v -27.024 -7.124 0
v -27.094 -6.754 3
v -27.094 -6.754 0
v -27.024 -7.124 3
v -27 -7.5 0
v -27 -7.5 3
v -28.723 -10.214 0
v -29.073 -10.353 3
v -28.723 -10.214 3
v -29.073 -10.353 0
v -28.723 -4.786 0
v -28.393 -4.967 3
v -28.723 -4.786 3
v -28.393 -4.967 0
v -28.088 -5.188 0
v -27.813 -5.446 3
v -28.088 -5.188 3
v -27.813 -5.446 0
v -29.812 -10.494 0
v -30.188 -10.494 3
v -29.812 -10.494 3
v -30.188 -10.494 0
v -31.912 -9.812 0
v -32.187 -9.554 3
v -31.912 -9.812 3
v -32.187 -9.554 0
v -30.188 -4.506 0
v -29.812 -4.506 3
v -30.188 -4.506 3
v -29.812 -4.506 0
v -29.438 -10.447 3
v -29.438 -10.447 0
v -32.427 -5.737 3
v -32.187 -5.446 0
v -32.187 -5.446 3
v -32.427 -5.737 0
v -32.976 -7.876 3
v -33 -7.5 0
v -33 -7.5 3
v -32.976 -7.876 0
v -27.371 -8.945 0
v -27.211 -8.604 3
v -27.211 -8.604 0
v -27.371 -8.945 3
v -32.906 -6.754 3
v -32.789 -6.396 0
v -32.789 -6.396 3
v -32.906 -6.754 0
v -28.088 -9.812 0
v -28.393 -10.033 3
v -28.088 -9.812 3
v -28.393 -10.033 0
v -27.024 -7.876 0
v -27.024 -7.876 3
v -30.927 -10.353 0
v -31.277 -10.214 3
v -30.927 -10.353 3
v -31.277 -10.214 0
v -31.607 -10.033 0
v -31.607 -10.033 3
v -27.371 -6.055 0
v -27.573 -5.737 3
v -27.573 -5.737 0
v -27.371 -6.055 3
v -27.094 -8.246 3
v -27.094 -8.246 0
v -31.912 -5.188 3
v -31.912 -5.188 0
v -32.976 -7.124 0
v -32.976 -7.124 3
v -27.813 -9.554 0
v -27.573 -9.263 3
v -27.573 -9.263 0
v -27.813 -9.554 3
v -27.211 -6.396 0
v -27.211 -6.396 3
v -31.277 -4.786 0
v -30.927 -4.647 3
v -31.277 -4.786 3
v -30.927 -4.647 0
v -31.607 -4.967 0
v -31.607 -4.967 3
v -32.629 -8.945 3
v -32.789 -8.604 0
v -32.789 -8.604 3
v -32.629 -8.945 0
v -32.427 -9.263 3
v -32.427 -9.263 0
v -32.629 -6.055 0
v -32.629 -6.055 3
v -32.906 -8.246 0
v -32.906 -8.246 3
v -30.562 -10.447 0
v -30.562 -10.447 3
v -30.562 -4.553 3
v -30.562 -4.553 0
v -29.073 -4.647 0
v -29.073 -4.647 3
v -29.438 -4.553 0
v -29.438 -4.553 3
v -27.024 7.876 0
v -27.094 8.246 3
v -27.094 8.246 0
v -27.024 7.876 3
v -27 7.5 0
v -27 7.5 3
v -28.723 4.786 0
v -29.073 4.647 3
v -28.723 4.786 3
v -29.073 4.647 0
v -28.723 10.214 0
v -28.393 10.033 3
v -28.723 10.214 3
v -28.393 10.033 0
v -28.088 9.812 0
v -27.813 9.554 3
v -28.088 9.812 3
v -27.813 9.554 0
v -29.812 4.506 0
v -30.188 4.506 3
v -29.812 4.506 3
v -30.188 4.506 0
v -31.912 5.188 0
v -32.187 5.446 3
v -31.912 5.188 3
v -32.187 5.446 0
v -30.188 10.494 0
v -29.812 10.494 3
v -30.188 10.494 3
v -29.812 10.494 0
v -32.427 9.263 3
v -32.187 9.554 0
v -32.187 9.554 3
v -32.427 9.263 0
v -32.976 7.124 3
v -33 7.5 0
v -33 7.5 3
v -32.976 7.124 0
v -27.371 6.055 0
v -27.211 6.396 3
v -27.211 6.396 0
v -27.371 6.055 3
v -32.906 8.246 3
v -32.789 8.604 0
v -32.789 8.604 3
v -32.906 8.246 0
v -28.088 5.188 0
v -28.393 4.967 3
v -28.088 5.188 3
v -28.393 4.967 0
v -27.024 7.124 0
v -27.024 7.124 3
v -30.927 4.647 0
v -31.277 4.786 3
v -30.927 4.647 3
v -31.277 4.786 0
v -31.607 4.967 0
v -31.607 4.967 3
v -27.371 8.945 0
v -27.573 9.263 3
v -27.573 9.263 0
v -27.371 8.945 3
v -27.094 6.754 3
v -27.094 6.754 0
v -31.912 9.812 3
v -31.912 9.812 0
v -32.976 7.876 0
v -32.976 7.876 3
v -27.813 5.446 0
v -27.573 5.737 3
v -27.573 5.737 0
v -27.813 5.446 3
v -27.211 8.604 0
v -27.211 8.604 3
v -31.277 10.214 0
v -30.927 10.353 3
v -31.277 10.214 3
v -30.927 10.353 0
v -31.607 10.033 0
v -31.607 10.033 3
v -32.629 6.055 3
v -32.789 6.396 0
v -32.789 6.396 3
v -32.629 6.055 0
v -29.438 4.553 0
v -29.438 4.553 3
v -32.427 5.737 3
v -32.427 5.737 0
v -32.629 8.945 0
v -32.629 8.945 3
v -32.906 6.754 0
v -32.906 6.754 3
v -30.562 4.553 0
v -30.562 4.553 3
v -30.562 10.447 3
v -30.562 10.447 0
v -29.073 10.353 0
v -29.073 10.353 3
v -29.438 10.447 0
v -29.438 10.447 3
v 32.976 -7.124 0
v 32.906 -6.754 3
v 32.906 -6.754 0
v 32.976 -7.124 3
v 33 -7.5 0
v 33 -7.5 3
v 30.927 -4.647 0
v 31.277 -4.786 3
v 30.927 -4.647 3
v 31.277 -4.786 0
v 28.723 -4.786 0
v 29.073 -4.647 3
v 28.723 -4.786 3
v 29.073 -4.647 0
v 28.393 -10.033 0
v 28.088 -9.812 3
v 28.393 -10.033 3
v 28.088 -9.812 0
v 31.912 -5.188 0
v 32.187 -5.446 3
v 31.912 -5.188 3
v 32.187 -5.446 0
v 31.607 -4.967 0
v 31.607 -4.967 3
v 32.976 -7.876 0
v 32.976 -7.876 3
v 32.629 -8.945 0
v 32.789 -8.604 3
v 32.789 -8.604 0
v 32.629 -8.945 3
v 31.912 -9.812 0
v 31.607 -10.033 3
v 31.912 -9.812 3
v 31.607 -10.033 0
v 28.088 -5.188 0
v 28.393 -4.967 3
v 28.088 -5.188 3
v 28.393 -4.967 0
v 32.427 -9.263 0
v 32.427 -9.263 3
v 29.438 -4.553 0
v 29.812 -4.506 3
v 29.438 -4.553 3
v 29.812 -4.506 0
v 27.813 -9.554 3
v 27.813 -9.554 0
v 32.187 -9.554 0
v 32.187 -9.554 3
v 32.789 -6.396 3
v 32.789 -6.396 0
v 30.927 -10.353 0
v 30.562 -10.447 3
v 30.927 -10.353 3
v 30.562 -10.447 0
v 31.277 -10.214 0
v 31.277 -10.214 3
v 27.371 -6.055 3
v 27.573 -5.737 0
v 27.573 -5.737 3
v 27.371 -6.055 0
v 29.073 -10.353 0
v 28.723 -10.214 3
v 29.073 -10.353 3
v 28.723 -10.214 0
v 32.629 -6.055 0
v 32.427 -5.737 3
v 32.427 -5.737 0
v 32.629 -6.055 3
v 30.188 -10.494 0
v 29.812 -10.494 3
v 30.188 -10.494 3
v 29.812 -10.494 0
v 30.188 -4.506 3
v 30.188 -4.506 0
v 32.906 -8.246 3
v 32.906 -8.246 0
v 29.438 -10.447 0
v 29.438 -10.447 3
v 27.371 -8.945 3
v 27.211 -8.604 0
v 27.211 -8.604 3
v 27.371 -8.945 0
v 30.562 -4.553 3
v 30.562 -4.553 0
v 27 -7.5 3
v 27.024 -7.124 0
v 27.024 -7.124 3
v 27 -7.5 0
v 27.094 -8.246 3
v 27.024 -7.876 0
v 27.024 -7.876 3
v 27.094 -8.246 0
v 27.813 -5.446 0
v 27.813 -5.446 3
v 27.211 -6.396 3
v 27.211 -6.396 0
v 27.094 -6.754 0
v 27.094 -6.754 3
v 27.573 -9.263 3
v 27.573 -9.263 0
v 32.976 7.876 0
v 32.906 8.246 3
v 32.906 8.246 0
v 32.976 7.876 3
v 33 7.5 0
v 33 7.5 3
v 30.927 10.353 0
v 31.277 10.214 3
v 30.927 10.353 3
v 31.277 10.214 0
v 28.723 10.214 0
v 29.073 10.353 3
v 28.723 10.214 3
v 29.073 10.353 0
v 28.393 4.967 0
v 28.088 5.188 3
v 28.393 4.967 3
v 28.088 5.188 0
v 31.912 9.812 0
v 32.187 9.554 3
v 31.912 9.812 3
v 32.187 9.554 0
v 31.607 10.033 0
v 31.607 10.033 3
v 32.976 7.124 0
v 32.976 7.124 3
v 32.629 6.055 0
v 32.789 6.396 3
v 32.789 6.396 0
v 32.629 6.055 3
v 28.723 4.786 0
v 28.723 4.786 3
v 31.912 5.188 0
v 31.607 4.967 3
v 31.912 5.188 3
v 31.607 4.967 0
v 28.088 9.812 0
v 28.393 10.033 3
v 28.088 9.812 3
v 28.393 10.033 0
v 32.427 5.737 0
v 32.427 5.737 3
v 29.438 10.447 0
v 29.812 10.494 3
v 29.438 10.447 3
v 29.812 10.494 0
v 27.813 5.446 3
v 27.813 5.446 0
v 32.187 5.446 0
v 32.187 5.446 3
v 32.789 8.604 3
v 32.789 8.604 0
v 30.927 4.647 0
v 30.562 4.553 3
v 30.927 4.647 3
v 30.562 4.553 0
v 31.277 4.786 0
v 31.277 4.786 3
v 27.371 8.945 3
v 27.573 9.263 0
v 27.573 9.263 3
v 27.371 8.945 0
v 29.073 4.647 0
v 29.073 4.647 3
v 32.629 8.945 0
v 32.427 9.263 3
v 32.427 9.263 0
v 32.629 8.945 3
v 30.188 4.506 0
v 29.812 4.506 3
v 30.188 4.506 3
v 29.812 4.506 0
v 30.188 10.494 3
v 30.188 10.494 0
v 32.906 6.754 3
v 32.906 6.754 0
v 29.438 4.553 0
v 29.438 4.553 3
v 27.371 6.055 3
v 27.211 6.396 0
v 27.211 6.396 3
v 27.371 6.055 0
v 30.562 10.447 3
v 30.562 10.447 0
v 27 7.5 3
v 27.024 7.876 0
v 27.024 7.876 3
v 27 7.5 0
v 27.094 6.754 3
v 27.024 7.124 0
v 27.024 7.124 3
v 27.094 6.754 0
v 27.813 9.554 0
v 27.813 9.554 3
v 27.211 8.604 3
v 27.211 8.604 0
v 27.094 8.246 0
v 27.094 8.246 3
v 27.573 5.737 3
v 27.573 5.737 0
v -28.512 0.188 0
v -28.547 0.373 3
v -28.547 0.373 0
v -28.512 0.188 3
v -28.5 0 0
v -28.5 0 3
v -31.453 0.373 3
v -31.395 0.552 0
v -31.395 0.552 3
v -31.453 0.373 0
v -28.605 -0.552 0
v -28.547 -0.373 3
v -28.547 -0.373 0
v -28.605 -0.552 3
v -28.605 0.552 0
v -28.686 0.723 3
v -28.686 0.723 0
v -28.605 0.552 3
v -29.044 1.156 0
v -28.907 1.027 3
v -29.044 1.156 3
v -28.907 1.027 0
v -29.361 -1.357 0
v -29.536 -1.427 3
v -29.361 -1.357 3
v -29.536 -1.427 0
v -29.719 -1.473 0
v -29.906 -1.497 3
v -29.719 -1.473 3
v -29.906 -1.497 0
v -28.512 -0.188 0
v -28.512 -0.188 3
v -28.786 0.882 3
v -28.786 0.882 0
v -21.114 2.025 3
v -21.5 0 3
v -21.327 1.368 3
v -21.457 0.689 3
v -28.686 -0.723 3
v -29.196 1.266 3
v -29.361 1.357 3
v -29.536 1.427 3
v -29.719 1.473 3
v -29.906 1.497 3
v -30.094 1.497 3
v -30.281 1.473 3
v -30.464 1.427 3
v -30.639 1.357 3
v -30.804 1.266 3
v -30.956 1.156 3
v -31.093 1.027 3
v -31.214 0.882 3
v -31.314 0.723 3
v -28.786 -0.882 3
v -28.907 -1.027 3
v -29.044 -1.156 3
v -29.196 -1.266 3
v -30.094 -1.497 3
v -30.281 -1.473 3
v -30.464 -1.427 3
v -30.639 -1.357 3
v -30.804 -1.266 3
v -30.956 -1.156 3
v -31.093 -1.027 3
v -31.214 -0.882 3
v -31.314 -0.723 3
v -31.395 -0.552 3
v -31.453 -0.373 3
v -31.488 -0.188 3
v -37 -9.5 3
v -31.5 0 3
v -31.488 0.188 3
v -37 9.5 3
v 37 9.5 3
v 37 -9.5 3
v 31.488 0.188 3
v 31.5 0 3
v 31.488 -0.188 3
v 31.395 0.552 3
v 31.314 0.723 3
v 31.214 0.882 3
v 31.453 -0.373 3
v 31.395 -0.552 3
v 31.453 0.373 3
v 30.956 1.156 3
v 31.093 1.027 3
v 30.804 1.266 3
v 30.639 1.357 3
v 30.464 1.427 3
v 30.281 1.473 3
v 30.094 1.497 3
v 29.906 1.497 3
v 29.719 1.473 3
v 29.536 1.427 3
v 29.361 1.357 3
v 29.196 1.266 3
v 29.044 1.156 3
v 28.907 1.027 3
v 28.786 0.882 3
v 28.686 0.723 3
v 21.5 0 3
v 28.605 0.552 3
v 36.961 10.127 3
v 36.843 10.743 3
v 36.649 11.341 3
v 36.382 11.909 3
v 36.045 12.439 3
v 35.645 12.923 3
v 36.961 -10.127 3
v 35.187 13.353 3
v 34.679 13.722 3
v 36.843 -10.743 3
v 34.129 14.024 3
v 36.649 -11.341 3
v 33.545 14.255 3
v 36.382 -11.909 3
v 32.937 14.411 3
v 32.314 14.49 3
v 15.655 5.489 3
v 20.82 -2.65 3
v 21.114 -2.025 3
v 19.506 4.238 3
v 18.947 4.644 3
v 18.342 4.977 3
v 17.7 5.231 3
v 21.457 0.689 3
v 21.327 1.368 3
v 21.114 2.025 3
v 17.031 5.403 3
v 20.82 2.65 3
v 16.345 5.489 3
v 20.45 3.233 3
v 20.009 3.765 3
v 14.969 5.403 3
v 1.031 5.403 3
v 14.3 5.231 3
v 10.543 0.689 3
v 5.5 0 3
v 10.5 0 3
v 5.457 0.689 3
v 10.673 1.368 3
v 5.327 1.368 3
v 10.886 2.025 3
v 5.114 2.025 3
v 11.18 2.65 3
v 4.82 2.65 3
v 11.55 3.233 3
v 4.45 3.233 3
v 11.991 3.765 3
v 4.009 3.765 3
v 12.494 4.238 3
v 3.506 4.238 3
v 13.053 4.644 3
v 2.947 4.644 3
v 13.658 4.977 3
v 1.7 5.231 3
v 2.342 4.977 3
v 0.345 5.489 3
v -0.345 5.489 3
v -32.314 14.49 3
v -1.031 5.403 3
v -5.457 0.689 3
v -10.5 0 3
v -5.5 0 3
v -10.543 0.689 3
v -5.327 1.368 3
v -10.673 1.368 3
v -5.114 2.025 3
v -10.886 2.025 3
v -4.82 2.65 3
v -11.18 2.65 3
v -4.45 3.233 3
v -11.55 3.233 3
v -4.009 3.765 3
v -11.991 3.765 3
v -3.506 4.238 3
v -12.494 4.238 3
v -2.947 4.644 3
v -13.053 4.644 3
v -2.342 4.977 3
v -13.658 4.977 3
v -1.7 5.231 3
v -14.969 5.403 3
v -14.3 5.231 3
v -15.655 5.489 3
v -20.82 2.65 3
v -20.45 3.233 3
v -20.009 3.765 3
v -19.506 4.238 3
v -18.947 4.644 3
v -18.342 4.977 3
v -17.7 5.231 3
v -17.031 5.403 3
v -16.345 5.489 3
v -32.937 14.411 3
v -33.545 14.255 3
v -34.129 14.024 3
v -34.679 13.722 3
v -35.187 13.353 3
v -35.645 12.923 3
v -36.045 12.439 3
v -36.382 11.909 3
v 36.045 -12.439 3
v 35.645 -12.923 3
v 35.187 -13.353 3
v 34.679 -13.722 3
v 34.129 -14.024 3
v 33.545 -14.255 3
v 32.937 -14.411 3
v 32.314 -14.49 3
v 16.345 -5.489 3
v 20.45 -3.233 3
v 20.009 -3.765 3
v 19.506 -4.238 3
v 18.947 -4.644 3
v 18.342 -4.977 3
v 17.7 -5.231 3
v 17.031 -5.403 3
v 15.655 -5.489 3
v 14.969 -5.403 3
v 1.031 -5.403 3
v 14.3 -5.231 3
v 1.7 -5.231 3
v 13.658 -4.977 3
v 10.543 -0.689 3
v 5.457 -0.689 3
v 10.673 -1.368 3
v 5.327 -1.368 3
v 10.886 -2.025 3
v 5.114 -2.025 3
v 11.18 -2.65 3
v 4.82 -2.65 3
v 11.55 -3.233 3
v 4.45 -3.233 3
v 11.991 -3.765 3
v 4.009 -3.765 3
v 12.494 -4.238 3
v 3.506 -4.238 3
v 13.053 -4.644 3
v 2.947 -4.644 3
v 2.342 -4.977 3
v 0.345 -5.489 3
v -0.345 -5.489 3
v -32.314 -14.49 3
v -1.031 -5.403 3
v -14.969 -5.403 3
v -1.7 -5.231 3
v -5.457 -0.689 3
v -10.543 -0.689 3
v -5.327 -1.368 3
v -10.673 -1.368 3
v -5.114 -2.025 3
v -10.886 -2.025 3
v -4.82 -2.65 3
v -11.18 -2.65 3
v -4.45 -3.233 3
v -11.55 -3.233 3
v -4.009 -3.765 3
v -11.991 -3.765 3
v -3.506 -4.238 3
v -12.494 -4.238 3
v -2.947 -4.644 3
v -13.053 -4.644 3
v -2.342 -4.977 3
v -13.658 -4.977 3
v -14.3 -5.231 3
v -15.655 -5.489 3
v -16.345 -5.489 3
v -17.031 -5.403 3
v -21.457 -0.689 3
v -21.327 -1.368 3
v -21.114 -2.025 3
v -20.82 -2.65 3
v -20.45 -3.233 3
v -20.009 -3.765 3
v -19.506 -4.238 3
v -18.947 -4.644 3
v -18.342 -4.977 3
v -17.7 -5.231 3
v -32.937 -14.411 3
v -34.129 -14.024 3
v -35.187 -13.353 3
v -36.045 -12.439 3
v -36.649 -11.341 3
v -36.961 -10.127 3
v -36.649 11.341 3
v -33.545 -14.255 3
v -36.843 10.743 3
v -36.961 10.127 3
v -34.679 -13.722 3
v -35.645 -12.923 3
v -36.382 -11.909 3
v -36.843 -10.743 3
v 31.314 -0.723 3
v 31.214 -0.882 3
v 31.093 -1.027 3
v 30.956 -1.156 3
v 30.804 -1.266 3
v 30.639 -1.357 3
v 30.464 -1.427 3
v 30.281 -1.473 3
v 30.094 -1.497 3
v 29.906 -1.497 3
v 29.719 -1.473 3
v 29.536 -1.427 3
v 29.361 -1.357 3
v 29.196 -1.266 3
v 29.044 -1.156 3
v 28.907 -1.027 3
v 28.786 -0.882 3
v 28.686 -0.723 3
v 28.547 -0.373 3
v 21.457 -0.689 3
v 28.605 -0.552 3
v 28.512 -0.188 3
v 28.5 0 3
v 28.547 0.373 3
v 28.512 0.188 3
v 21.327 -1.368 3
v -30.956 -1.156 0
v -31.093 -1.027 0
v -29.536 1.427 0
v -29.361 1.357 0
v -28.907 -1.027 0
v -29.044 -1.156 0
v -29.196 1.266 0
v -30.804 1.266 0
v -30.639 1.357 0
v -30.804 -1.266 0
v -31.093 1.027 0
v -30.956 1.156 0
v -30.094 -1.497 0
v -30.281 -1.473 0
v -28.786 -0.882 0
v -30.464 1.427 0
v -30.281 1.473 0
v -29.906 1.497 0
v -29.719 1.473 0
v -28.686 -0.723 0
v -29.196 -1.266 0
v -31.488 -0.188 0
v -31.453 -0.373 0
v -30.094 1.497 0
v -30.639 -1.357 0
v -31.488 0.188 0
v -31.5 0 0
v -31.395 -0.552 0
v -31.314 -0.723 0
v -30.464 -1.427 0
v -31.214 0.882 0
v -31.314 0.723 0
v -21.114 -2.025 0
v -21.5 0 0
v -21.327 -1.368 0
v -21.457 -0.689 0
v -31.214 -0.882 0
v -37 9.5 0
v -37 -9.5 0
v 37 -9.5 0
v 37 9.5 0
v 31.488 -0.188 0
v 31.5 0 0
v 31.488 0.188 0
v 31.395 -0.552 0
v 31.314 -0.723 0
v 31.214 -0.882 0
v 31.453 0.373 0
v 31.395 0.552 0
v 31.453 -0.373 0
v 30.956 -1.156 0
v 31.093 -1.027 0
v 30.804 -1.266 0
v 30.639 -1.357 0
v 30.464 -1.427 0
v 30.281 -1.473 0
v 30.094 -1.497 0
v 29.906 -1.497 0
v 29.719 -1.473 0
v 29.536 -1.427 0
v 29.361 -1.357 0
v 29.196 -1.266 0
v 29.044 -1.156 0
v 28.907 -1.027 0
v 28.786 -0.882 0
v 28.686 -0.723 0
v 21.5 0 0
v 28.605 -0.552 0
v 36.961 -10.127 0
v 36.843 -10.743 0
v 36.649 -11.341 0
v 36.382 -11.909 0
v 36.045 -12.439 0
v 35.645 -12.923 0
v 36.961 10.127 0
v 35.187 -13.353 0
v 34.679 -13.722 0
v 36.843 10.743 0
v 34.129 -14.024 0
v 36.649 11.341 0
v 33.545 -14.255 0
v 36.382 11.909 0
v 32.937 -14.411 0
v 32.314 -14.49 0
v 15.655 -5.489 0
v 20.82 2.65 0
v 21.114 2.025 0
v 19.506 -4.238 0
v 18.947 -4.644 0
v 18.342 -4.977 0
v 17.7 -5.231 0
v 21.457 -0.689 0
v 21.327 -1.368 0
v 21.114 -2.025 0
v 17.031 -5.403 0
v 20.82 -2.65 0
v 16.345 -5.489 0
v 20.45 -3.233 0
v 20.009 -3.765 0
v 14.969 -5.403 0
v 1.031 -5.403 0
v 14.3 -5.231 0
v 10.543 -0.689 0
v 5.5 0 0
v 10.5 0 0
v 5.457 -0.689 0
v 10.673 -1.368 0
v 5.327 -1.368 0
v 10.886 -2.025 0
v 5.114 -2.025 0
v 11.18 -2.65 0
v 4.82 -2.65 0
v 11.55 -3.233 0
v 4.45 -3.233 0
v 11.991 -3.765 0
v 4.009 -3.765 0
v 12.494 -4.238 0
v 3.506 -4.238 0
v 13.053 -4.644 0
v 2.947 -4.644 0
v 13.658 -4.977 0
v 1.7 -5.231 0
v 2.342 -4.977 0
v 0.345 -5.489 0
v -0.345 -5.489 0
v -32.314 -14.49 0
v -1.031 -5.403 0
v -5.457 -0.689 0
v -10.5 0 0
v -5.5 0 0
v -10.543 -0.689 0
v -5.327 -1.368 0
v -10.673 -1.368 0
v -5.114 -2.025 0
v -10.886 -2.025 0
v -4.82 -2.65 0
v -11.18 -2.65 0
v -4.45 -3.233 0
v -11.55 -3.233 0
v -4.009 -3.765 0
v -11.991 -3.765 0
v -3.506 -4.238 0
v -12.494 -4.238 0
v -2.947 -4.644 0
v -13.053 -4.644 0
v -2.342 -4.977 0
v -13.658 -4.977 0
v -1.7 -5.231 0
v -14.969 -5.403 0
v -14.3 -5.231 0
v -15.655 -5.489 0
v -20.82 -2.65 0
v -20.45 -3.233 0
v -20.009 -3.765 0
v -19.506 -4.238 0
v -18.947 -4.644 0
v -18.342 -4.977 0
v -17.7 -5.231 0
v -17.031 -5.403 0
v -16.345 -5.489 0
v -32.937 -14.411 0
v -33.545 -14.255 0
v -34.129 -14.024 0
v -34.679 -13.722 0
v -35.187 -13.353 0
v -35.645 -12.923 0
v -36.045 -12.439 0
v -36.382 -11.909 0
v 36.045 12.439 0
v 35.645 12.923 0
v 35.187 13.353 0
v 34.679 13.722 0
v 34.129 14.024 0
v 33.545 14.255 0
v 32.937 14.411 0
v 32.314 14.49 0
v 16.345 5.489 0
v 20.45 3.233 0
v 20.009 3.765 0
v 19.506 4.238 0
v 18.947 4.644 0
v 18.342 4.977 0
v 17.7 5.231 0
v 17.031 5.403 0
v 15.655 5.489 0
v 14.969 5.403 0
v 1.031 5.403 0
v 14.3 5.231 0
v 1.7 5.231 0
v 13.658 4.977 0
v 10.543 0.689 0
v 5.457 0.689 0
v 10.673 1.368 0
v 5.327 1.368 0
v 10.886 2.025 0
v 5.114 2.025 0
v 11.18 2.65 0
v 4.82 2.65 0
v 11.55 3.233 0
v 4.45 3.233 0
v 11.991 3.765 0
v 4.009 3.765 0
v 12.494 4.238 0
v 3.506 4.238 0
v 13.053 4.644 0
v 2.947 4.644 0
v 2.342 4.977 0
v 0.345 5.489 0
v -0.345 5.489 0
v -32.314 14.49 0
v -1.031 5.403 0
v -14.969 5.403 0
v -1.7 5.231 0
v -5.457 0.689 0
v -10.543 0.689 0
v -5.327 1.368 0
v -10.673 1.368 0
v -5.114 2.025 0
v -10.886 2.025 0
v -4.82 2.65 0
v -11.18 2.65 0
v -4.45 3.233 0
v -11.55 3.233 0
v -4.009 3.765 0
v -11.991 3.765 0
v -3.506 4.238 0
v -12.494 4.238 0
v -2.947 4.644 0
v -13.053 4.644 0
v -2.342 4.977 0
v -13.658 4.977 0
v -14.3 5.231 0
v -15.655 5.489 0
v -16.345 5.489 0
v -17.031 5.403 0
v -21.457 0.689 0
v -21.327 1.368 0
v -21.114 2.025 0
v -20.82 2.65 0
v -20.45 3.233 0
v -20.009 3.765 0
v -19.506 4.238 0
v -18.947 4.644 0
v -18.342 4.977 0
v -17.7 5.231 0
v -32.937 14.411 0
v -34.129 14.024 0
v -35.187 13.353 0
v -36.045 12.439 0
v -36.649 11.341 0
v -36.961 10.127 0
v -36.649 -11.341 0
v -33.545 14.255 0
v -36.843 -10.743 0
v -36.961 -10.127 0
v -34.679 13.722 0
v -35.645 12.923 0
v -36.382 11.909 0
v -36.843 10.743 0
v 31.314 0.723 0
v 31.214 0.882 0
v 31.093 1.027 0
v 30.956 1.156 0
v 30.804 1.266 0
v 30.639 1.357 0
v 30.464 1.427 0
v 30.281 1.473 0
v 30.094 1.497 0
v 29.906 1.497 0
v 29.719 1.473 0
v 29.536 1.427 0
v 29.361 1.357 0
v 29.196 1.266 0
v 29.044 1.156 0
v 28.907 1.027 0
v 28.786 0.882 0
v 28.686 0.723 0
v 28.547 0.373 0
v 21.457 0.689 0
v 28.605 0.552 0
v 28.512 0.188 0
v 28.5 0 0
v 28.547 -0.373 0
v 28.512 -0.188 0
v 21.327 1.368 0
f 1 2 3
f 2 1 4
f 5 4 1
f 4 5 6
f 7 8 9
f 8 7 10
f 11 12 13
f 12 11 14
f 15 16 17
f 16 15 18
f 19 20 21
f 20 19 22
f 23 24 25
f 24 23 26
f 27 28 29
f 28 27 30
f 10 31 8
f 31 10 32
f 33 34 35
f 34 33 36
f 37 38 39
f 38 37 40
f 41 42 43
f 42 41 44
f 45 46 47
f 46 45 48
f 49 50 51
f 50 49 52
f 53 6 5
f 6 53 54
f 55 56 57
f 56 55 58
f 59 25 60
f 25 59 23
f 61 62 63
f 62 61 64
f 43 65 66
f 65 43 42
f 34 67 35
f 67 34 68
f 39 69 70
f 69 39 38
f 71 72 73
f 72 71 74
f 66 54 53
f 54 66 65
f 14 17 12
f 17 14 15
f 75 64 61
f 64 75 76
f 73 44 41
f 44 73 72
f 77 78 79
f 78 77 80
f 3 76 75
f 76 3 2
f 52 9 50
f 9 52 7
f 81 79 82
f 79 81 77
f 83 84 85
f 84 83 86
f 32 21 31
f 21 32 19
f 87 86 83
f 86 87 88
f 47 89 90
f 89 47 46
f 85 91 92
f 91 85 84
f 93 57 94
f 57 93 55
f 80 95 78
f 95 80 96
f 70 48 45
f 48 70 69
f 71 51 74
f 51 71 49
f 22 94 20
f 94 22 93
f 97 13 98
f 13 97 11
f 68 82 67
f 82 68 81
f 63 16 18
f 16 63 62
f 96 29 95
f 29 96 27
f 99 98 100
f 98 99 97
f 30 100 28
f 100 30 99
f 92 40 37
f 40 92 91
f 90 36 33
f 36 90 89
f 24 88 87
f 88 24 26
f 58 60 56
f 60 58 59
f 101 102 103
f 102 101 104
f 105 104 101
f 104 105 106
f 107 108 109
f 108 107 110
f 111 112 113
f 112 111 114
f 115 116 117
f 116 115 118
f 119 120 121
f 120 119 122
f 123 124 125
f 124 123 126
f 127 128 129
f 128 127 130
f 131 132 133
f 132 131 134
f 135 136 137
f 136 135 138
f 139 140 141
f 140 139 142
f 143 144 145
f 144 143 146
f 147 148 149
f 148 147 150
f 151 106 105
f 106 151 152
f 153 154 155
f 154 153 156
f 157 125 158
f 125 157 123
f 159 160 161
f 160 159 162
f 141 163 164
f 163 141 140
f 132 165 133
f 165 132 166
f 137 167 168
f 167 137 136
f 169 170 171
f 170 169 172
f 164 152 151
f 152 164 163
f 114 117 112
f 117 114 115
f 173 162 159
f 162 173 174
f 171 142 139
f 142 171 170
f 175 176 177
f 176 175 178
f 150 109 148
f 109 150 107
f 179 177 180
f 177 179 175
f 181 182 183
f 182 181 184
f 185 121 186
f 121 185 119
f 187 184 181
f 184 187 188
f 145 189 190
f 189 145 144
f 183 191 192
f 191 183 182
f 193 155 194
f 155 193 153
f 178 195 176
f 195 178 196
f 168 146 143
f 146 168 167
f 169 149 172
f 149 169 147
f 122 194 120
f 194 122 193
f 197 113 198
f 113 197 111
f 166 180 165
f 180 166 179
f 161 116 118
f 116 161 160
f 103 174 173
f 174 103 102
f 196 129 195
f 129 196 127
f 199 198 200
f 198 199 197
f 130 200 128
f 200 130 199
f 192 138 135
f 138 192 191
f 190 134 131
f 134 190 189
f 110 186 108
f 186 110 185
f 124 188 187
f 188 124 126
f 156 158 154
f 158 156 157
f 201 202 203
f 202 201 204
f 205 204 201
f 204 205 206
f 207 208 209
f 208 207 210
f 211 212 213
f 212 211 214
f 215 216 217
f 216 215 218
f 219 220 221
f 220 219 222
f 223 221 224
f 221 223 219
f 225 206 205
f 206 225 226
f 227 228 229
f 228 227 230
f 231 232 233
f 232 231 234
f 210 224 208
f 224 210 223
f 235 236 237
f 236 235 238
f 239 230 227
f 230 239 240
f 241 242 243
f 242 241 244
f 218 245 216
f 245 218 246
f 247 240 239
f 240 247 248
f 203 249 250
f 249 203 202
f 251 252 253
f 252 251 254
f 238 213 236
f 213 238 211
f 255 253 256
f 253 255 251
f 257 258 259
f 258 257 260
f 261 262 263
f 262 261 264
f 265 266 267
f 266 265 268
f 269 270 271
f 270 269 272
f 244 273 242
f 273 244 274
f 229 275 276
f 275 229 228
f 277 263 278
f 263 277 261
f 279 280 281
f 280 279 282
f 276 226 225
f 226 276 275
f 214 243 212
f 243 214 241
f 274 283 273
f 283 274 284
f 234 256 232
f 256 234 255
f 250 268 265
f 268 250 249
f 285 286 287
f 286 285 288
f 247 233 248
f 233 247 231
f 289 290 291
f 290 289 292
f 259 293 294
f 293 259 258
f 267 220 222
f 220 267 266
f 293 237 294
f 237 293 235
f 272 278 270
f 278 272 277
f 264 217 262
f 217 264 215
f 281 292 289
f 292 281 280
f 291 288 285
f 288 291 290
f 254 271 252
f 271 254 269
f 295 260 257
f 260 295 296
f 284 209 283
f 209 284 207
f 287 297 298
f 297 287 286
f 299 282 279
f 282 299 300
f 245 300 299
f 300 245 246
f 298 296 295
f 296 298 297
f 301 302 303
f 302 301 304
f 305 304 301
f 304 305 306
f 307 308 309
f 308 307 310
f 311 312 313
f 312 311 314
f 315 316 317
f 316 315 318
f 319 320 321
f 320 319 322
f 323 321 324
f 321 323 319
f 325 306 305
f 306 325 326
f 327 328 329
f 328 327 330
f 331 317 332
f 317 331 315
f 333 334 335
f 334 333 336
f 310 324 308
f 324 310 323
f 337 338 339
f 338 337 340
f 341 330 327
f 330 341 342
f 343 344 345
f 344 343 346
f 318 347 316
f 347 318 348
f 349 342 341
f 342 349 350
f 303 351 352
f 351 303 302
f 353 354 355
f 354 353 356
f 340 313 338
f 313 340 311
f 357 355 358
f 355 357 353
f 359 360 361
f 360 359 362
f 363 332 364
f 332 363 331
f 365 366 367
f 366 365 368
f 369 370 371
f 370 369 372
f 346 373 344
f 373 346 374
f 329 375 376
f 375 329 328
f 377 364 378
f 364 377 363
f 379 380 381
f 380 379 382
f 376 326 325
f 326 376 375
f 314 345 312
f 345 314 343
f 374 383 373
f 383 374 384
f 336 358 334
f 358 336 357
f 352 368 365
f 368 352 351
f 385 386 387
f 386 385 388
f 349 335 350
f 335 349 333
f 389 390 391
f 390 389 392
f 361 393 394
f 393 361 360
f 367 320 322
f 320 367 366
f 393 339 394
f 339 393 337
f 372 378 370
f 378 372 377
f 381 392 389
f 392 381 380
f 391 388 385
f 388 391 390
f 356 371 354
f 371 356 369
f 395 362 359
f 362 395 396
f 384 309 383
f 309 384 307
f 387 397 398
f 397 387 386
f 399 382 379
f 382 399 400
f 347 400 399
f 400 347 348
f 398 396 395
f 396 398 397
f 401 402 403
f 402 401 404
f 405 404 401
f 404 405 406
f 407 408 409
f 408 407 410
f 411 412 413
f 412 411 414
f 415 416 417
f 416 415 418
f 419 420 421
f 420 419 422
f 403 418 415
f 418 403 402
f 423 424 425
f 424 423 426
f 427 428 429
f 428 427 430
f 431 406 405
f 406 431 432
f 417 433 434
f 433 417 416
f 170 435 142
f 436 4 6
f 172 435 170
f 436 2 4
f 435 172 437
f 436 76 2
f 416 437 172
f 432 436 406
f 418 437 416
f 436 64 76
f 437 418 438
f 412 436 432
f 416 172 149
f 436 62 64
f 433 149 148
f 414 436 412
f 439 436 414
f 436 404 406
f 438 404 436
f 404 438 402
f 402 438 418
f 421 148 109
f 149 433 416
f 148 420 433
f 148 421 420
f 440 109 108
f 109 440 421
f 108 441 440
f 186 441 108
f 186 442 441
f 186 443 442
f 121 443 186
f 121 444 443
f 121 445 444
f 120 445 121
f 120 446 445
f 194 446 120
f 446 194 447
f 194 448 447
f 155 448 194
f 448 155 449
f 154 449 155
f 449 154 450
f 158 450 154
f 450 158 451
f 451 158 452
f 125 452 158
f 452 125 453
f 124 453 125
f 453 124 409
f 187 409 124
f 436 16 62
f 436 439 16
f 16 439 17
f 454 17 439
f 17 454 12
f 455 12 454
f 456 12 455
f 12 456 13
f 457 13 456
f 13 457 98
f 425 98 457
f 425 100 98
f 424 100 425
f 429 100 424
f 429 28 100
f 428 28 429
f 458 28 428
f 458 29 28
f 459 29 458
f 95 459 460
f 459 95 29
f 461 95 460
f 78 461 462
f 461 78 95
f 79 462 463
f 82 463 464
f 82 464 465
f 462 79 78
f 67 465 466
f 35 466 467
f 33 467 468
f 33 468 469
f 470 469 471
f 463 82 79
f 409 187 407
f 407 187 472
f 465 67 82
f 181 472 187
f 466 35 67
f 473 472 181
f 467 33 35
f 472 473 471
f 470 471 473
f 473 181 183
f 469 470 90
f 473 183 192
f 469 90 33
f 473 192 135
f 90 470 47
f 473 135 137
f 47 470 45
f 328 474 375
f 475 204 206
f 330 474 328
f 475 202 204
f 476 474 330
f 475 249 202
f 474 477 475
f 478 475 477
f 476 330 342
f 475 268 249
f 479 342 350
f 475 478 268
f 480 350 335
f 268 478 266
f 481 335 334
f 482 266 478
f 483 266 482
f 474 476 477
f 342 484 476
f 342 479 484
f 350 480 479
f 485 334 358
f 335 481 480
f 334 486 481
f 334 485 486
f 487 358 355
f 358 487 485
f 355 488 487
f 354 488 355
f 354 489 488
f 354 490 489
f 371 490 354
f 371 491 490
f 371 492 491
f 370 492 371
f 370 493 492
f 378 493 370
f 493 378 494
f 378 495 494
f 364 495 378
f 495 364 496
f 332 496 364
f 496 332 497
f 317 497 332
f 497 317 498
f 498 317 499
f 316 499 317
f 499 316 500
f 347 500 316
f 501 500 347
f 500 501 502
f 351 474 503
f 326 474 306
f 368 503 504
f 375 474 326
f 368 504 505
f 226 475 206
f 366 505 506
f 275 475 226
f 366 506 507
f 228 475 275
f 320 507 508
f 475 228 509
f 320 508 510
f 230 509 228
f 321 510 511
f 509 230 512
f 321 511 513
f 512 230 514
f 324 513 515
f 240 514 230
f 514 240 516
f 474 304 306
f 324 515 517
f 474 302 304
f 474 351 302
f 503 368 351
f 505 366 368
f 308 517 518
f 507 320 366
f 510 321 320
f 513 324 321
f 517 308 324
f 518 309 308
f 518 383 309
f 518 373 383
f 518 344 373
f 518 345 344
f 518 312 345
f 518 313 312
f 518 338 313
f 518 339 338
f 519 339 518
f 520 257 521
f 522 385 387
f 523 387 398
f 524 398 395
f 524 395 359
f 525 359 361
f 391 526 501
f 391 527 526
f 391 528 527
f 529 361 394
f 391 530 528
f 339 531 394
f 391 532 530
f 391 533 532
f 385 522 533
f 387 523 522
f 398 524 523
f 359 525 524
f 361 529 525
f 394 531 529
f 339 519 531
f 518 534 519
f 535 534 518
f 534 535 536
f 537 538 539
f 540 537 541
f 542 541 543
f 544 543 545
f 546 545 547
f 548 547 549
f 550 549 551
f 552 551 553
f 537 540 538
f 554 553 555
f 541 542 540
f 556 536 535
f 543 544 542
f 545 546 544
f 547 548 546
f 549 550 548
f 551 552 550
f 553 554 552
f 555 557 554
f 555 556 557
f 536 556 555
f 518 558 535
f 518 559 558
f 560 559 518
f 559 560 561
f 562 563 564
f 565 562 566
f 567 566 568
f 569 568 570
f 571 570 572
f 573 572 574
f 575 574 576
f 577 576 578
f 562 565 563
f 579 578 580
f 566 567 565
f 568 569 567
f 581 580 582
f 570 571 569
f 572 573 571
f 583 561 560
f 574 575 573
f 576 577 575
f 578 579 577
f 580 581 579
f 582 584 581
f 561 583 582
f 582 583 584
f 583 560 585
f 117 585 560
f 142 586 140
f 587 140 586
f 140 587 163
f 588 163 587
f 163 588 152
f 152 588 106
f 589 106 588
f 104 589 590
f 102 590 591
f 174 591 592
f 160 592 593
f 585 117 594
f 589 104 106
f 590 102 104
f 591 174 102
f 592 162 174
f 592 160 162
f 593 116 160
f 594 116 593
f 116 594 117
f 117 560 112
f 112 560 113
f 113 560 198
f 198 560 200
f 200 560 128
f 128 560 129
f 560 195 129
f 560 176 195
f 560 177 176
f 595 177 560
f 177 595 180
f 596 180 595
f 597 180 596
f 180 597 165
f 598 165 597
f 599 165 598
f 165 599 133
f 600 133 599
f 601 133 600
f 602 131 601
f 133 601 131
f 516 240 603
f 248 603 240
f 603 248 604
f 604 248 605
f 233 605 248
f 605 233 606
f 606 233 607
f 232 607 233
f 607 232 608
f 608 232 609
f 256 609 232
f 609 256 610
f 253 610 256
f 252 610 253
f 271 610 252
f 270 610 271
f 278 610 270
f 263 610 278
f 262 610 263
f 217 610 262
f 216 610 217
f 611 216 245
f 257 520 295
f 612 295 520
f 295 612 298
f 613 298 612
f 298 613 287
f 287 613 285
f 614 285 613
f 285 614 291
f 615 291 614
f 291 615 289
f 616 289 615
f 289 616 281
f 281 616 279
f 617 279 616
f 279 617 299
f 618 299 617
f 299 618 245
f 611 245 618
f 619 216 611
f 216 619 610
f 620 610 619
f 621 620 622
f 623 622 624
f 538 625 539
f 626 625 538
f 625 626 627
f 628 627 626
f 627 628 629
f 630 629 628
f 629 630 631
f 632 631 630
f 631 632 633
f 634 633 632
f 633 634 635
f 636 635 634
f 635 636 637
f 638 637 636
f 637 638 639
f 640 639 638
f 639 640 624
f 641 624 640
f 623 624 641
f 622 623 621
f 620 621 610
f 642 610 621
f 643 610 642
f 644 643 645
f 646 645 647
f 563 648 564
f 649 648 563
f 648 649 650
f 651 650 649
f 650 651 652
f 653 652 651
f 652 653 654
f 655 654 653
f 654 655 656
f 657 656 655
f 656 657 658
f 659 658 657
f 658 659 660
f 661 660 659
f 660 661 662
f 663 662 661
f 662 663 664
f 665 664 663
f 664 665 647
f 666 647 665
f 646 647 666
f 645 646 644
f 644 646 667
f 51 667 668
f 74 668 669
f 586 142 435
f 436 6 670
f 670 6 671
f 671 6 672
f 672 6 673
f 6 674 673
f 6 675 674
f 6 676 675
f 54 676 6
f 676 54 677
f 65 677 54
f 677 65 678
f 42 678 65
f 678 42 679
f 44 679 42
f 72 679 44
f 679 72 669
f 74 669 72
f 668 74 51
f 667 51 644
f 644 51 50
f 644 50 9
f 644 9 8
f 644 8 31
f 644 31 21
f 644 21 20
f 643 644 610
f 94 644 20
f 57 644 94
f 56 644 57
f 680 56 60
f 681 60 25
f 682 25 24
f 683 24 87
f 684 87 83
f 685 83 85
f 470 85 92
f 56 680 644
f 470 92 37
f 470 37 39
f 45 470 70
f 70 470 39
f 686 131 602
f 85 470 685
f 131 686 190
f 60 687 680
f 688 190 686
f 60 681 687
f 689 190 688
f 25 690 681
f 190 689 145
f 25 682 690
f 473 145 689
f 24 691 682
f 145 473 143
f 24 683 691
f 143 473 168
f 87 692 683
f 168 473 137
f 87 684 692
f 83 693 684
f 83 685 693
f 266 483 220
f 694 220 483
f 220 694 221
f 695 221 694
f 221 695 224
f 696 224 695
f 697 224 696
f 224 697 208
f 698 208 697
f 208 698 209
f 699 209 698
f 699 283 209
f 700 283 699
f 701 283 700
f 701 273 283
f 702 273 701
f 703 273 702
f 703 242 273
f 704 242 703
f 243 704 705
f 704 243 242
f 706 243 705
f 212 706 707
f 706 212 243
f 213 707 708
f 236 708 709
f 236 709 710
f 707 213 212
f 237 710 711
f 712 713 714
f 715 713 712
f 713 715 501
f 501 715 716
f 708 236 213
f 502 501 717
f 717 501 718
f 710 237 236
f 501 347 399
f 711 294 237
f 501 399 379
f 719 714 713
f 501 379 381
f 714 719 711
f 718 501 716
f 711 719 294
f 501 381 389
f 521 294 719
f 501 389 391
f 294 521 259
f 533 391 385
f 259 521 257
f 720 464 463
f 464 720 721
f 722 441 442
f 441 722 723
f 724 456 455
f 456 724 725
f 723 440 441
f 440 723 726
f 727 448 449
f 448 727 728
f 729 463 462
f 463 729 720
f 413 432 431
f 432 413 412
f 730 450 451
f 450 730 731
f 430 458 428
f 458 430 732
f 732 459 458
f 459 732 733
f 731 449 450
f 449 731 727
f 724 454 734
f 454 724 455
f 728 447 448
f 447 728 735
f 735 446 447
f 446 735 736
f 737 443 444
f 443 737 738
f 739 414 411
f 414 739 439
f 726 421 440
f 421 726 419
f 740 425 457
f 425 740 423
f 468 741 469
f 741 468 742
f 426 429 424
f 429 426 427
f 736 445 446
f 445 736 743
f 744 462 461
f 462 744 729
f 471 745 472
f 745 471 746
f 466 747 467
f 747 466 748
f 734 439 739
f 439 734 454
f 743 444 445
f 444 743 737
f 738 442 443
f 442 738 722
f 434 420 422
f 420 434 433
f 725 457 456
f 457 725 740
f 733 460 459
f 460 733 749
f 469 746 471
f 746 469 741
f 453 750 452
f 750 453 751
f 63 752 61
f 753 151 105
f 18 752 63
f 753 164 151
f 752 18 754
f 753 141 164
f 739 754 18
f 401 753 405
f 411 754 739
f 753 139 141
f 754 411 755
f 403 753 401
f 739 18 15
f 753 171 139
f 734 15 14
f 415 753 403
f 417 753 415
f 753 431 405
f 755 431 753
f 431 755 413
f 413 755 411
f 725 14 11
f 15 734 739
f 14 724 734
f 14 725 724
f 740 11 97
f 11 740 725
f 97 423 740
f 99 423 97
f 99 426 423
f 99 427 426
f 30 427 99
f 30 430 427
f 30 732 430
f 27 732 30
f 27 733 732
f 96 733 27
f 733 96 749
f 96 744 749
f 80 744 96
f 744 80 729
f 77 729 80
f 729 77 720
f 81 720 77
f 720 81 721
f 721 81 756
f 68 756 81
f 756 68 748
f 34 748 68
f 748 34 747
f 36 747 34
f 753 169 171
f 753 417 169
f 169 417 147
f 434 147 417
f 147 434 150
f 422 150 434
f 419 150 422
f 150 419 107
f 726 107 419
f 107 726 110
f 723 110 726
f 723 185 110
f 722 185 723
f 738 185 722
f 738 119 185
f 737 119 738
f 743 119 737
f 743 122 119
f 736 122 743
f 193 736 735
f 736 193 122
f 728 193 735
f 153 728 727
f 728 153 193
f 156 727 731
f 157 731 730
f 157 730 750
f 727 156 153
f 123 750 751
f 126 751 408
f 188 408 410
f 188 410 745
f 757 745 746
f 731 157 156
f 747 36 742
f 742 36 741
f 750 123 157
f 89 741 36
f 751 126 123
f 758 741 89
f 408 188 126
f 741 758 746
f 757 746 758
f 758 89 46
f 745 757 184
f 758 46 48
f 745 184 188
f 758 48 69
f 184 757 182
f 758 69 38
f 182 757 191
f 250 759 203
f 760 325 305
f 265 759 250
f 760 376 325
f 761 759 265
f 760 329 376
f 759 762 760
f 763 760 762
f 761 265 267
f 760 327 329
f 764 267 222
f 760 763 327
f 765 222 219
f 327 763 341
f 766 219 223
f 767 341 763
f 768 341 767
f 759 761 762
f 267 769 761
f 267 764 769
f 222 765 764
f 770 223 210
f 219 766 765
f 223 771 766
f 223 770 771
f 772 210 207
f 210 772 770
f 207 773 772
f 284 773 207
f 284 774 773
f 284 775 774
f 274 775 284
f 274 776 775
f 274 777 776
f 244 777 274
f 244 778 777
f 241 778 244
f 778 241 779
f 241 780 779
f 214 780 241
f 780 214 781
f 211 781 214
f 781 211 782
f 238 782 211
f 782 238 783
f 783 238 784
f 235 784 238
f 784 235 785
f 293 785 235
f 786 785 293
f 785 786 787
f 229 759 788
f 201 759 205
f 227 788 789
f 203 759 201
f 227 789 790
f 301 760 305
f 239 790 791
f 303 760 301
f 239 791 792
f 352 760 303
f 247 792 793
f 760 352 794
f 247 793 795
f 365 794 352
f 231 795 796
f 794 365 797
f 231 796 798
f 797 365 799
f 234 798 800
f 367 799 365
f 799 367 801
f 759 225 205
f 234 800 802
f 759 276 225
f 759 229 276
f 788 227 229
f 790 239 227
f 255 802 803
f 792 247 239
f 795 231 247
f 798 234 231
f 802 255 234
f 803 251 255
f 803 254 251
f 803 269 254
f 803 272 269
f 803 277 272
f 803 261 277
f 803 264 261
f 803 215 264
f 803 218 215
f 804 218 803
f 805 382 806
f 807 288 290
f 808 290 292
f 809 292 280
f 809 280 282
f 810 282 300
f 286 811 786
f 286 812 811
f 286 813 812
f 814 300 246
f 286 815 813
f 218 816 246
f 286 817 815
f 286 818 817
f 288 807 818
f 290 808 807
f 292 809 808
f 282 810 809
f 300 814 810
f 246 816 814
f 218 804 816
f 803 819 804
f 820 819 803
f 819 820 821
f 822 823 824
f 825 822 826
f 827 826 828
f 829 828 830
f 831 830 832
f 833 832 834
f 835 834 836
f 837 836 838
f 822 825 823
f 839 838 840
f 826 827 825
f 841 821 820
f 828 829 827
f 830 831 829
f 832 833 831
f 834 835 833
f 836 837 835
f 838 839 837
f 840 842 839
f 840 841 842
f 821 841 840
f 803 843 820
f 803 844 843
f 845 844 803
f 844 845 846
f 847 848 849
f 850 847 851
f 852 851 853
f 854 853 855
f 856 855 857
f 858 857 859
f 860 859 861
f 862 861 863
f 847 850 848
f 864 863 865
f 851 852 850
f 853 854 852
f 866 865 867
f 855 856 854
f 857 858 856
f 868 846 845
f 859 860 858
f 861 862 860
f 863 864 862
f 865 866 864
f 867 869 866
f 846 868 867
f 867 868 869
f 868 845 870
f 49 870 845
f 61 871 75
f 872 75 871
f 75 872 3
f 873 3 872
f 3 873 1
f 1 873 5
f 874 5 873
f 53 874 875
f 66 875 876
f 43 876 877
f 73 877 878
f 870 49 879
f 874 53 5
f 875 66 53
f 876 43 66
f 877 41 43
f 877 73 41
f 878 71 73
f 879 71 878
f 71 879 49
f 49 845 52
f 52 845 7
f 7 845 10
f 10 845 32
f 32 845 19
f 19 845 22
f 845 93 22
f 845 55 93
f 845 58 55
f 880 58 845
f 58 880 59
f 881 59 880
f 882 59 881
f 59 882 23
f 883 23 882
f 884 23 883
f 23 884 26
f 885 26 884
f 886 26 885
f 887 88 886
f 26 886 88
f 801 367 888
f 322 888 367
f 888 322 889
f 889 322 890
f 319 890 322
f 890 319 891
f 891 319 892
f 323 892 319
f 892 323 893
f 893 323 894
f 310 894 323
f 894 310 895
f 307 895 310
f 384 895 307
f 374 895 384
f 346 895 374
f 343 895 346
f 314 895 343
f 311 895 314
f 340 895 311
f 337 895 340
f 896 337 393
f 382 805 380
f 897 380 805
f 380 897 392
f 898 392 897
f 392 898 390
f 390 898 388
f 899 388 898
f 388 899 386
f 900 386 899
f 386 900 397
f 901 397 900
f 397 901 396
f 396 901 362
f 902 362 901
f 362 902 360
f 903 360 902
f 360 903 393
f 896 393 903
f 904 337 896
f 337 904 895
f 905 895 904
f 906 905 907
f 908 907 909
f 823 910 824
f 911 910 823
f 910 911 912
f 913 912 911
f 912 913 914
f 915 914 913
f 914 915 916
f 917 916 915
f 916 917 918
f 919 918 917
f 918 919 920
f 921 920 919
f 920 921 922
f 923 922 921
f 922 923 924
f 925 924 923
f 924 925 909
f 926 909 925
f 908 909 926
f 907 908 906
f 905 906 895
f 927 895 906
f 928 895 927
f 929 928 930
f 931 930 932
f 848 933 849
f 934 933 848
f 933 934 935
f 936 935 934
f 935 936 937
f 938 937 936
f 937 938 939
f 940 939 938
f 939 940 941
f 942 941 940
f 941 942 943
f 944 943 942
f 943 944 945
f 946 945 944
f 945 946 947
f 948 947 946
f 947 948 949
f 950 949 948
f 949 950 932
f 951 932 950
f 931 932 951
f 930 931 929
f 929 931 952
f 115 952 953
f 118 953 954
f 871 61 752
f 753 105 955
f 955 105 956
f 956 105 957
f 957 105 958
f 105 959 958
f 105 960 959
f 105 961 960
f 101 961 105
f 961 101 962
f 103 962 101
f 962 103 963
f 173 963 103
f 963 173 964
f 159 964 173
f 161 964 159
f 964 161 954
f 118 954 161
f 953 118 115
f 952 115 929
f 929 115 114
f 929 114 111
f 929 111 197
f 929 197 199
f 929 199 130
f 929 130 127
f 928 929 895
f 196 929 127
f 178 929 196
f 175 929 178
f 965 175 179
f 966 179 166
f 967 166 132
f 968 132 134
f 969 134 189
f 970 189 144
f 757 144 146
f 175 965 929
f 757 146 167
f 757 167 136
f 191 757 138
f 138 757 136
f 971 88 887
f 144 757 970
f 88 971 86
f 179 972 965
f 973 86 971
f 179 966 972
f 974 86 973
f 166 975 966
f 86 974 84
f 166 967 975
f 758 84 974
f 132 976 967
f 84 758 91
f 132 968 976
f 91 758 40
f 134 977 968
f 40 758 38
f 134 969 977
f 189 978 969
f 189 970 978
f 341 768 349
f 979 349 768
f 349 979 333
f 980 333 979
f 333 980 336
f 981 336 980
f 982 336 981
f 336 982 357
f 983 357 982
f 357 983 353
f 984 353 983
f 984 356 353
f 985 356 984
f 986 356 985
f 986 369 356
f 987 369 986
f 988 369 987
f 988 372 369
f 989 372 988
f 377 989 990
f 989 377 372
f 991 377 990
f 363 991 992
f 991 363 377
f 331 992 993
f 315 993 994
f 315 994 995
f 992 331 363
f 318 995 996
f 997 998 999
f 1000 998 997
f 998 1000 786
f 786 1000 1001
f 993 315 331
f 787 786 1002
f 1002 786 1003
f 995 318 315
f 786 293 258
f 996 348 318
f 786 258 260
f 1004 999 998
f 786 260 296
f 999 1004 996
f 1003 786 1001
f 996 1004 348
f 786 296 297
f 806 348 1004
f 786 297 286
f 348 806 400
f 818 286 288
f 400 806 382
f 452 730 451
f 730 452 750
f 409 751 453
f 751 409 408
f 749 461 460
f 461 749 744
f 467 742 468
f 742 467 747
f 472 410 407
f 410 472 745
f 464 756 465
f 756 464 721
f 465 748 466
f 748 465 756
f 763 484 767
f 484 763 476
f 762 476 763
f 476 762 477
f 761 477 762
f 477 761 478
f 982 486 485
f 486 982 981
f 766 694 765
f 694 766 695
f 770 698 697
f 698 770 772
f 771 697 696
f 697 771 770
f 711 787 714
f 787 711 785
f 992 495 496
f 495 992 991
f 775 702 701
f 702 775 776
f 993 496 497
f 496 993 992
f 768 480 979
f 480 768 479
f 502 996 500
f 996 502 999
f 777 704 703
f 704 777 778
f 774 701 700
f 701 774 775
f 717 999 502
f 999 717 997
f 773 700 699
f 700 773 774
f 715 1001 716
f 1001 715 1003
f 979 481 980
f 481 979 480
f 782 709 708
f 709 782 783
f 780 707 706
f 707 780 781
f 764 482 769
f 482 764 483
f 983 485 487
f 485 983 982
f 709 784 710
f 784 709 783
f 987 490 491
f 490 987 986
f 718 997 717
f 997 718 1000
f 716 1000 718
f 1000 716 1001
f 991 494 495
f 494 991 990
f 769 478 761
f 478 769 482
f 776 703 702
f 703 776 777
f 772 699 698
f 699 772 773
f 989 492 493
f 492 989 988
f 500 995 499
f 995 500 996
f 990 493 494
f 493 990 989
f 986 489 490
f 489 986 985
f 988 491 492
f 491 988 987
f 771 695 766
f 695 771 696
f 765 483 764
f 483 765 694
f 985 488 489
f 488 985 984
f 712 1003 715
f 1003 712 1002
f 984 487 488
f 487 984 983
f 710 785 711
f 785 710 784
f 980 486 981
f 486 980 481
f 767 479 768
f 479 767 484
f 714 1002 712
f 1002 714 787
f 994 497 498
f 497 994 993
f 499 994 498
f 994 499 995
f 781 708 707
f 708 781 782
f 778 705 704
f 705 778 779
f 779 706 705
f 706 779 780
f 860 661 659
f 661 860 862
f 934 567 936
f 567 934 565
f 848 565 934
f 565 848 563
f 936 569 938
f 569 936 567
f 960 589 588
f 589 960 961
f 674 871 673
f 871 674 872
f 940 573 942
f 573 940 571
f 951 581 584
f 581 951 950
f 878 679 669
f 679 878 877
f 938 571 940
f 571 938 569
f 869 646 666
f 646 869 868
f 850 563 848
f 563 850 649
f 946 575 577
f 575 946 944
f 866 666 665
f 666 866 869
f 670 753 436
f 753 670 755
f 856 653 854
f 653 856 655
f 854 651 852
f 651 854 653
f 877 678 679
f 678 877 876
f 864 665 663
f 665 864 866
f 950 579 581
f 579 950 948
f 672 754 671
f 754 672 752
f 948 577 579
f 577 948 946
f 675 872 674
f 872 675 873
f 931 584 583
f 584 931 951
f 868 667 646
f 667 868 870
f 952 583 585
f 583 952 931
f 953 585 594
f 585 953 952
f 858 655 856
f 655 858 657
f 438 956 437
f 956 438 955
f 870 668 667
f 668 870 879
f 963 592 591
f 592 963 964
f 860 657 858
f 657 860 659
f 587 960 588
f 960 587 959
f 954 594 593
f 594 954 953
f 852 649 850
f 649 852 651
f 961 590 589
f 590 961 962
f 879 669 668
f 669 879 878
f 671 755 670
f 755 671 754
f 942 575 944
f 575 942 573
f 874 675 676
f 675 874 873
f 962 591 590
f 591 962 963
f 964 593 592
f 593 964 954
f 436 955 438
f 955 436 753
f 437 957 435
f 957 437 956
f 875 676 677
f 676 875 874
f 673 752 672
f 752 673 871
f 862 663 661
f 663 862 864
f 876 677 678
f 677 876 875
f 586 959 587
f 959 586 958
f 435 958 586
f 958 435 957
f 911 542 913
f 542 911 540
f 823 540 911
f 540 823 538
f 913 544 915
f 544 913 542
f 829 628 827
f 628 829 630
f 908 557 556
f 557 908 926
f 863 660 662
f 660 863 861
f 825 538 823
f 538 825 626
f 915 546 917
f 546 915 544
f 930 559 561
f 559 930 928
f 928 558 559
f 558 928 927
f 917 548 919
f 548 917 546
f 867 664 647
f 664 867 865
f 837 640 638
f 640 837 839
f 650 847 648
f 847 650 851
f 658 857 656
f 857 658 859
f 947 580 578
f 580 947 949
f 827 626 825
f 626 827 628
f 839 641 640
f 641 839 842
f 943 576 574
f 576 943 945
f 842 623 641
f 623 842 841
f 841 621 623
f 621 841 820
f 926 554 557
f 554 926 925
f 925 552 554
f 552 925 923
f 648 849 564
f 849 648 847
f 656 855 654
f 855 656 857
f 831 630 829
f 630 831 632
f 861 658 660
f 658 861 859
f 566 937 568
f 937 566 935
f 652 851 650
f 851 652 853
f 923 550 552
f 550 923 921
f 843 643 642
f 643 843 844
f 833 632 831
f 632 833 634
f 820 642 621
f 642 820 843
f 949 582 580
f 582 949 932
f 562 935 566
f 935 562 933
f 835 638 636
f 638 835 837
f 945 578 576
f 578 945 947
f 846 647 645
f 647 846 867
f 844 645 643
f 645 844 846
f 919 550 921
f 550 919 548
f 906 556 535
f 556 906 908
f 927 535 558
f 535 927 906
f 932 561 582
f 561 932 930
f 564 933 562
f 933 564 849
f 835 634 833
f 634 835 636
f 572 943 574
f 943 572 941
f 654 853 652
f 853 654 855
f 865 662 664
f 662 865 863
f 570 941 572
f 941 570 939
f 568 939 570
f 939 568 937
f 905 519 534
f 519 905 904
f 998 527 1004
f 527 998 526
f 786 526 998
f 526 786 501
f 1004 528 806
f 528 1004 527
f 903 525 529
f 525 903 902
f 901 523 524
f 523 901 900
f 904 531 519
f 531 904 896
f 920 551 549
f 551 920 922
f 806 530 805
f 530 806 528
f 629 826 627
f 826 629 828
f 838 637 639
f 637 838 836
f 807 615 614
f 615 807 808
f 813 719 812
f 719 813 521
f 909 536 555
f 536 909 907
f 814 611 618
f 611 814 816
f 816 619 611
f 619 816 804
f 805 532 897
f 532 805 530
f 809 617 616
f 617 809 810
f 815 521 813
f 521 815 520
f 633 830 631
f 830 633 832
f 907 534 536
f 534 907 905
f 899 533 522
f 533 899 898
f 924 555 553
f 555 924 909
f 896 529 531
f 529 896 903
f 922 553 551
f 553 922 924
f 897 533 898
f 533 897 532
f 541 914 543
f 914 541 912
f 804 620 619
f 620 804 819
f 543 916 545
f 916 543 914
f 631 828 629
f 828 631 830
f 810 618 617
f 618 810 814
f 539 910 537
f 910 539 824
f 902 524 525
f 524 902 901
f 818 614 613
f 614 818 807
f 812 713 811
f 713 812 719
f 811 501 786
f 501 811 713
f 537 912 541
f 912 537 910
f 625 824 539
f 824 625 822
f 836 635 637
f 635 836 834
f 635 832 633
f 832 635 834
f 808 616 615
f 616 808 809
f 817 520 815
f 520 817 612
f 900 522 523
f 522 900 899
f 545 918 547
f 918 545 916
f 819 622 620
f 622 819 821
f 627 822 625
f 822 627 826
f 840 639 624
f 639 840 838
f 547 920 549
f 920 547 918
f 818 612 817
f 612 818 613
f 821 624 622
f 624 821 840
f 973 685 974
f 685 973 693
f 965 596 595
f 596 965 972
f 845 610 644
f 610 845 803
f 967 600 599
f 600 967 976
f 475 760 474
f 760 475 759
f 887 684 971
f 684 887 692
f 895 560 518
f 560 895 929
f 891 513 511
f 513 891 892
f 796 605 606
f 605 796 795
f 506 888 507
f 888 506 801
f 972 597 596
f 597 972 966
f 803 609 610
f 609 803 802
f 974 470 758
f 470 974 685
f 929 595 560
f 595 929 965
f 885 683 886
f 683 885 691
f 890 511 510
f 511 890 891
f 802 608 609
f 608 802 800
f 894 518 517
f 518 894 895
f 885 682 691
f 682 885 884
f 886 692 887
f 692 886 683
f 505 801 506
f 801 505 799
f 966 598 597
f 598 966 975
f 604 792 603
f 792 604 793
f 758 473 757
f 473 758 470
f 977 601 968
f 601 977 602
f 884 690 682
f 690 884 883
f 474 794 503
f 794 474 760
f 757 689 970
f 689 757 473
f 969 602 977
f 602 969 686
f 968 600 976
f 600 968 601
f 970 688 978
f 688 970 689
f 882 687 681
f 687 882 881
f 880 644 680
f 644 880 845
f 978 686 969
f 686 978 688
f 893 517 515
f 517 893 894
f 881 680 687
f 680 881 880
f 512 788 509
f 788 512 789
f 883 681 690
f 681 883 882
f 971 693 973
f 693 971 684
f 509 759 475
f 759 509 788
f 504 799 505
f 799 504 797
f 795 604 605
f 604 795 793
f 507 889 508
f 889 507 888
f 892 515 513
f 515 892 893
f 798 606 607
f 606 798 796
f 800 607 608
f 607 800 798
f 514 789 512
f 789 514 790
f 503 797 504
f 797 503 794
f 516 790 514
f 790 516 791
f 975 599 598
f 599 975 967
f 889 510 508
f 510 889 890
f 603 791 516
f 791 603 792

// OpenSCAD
$fn = 50;


difference() {
	union() {
		hull() {
			translate(v = [-32.0000000000, 9.5000000000, 0]) {
				cylinder(h = 3, r = 5);
			}
			translate(v = [32.0000000000, 9.5000000000, 0]) {
				cylinder(h = 3, r = 5);
			}
			translate(v = [-32.0000000000, -9.5000000000, 0]) {
				cylinder(h = 3, r = 5);
			}
			translate(v = [32.0000000000, -9.5000000000, 0]) {
				cylinder(h = 3, r = 5);
			}
		}
	}
	union() {
		#translate(v = [-30.0000000000, -7.5000000000, 0]) {
			cylinder(h = 3, r = 3.0000000000);
		}
		#translate(v = [-30.0000000000, 7.5000000000, 0]) {
			cylinder(h = 3, r = 3.0000000000);
		}
		#translate(v = [30.0000000000, -7.5000000000, 0]) {
			cylinder(h = 3, r = 3.0000000000);
		}
		#translate(v = [30.0000000000, 7.5000000000, 0]) {
			cylinder(h = 3, r = 3.0000000000);
		}
		#translate(v = [-30.0000000000, -7.5000000000, -100.0000000000]) {
			cylinder(h = 200, r = 3.0000000000);
		}
		#translate(v = [-30.0000000000, 7.5000000000, -100.0000000000]) {
			cylinder(h = 200, r = 3.0000000000);
		}
		#translate(v = [30.0000000000, -7.5000000000, -100.0000000000]) {
			cylinder(h = 200, r = 3.0000000000);
		}
		#translate(v = [30.0000000000, 7.5000000000, -100.0000000000]) {
			cylinder(h = 200, r = 3.0000000000);
		}
		#translate(v = [-30.0000000000, -7.5000000000, 0]) {
			cylinder(h = 3, r = 1.5000000000);
		}
		#translate(v = [-30.0000000000, 0.0000000000, 0]) {
			cylinder(h = 3, r = 1.5000000000);
		}
		#translate(v = [-30.0000000000, 7.5000000000, 0]) {
			cylinder(h = 3, r = 1.5000000000);
		}
		#translate(v = [30.0000000000, -7.5000000000, 0]) {
			cylinder(h = 3, r = 1.5000000000);
		}
		#translate(v = [30.0000000000, 0.0000000000, 0]) {
			cylinder(h = 3, r = 1.5000000000);
		}
		#translate(v = [30.0000000000, 7.5000000000, 0]) {
			cylinder(h = 3, r = 1.5000000000);
		}
		#translate(v = [-30.0000000000, -7.5000000000, 0]) {
			cylinder(h = 3, r = 1.5000000000);
		}
		#translate(v = [-30.0000000000, 0.0000000000, 0]) {
			cylinder(h = 3, r = 1.5000000000);
		}
		#translate(v = [-30.0000000000, 7.5000000000, 0]) {
			cylinder(h = 3, r = 1.5000000000);
		}
		#translate(v = [30.0000000000, -7.5000000000, 0]) {
			cylinder(h = 3, r = 1.5000000000);
		}
		#translate(v = [30.0000000000, 0.0000000000, 0]) {
			cylinder(h = 3, r = 1.5000000000);
		}
		#translate(v = [30.0000000000, 7.5000000000, 0]) {
			cylinder(h = 3, r = 1.5000000000);
		}
		#translate(v = [-30.0000000000, -7.5000000000, 0]) {
			cylinder(h = 3, r = 1.5000000000);
		}
		#translate(v = [-30.0000000000, 0.0000000000, 0]) {
			cylinder(h = 3, r = 1.5000000000);
		}
		#translate(v = [-30.0000000000, 7.5000000000, 0]) {
			cylinder(h = 3, r = 1.5000000000);
		}
		#translate(v = [30.0000000000, -7.5000000000, 0]) {
			cylinder(h = 3, r = 1.5000000000);
		}
		#translate(v = [30.0000000000, 0.0000000000, 0]) {
			cylinder(h = 3, r = 1.5000000000);
		}
		#translate(v = [30.0000000000, 7.5000000000, 0]) {
			cylinder(h = 3, r = 1.5000000000);
		}
		#translate(v = [-16.0000000000, 0, 0]) {
			cylinder(h = 3, r = 5.5000000000);
		}
		#cylinder(h = 3, r = 5.5000000000);
		#translate(v = [16.0000000000, 0, 0]) {
			cylinder(h = 3, r = 5.5000000000);
		}
	}
}
